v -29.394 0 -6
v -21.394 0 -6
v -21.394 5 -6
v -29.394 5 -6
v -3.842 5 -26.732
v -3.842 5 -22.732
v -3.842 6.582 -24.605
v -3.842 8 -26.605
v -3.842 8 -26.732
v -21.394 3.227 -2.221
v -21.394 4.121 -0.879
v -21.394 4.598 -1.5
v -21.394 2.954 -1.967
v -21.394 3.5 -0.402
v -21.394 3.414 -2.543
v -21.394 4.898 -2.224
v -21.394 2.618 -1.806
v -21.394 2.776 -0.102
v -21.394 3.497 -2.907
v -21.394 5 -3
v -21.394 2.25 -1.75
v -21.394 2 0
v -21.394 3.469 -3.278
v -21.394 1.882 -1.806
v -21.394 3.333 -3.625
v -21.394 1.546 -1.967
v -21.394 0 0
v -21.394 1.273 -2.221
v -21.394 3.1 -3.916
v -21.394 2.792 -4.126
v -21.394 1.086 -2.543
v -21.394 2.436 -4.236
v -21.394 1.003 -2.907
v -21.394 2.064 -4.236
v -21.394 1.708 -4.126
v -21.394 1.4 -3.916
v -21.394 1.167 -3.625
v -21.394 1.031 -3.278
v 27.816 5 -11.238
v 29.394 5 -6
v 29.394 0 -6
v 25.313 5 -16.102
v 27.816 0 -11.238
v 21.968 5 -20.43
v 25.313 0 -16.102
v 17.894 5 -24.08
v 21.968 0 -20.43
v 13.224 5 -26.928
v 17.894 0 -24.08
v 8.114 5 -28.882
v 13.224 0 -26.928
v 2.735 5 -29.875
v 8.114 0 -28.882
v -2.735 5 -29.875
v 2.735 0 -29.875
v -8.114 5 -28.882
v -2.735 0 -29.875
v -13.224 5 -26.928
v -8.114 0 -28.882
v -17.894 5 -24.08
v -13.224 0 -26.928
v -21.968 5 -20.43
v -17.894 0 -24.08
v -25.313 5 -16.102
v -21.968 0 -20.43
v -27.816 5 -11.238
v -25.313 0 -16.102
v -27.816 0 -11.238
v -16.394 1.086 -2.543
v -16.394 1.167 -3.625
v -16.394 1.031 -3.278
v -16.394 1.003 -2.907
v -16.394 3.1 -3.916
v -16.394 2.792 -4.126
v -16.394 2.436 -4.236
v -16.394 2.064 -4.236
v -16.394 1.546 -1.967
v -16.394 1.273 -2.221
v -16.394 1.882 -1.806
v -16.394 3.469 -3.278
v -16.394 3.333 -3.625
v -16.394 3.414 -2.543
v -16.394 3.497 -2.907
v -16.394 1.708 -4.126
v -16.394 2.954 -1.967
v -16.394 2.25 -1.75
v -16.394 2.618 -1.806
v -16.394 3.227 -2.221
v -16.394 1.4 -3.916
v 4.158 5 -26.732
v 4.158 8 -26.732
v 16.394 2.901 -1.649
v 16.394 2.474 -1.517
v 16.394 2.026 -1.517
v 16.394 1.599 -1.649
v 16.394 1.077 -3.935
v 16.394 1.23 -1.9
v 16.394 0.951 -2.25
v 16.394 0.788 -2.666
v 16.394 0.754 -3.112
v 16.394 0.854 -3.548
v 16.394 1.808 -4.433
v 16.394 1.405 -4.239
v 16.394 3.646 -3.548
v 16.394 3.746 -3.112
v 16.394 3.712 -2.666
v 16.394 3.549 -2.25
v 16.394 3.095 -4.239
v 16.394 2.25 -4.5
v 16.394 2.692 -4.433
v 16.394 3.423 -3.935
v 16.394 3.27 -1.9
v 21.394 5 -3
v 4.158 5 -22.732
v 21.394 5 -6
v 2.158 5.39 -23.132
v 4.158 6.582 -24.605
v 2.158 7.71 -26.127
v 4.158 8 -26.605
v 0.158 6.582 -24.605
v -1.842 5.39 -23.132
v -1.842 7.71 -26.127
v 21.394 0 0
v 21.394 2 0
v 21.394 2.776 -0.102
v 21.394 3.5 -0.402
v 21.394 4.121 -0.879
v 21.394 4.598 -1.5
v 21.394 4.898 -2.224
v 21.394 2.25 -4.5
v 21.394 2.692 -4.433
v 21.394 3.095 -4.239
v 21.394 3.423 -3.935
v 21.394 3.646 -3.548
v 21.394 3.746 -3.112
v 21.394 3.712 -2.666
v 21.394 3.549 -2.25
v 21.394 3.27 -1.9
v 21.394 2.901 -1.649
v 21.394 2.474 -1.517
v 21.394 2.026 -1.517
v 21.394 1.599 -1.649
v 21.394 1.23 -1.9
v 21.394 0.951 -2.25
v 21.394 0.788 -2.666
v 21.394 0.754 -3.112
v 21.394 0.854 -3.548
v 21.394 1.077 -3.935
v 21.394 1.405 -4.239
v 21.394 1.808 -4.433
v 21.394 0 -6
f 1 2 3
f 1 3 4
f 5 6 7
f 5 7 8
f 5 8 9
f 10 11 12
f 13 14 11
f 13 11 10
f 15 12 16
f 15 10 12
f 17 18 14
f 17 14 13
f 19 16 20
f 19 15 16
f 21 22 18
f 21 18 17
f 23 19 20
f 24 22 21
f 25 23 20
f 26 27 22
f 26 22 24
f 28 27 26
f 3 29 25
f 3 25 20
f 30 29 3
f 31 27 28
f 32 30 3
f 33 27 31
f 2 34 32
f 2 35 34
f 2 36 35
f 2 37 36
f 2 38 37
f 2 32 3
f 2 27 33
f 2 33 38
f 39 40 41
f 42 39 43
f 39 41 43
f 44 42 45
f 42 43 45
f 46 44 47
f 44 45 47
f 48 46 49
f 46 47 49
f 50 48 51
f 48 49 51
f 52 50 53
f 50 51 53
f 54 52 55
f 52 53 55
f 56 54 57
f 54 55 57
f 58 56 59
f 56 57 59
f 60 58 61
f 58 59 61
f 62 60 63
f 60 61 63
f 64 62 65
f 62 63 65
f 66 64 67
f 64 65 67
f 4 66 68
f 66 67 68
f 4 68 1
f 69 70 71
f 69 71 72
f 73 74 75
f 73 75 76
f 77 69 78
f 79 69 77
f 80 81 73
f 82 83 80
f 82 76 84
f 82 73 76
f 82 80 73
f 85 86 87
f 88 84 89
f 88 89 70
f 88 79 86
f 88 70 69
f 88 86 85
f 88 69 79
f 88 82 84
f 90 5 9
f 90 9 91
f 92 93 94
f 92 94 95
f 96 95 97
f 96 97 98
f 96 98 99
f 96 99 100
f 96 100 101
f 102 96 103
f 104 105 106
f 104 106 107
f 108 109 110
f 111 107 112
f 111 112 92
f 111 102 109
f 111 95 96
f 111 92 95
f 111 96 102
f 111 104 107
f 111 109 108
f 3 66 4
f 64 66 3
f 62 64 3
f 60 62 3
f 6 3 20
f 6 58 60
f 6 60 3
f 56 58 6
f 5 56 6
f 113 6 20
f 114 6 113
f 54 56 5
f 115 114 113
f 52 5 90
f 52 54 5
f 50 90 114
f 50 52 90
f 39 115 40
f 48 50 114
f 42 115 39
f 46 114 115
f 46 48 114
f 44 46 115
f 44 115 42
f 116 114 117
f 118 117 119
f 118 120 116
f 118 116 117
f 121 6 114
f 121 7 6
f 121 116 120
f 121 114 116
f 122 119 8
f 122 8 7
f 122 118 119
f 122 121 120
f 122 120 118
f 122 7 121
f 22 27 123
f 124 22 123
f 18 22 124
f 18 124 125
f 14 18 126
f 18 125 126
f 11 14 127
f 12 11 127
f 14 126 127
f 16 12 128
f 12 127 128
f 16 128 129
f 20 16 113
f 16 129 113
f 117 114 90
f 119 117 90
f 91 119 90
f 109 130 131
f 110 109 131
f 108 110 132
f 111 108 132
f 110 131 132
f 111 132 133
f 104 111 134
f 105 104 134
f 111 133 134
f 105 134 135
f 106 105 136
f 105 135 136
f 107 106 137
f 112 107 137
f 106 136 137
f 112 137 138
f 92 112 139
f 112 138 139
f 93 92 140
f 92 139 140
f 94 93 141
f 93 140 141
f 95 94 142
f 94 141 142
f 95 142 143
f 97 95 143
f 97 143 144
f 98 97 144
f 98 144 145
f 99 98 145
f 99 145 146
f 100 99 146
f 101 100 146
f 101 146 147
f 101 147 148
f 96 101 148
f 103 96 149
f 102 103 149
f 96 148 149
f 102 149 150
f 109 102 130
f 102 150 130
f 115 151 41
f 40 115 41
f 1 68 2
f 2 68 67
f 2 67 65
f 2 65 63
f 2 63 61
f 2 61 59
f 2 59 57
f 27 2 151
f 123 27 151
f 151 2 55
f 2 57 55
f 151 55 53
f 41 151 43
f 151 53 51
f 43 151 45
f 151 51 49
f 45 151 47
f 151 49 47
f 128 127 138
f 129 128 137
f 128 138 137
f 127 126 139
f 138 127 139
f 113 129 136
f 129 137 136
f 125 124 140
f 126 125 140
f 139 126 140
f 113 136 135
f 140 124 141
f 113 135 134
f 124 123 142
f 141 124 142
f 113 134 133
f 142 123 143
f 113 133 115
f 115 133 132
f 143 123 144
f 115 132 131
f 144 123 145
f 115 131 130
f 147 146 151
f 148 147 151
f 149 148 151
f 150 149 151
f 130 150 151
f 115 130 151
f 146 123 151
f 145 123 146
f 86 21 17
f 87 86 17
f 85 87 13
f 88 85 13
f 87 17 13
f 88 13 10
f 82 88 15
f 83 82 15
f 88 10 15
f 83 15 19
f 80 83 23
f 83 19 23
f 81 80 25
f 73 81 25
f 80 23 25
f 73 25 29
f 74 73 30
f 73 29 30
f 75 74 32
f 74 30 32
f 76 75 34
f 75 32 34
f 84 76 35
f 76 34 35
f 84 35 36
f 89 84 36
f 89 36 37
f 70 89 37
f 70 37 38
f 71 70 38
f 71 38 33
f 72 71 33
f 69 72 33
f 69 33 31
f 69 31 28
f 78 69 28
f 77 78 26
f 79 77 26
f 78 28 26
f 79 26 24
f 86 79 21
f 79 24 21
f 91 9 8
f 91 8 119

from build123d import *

# Parameters (mm, degrees)
BOSS_EXTRUDE1_DEPTH = 5
SKETCH3_W           = 8
SKETCH3_H           = 4
BOSS_EXTRUDE2_DEPTH = 3
FILLET1_START       = -3.841593316
FILLET1_DEPTH       = 8
CUT_EXTRUDE1_START  = -10
CUT_EXTRUDE1_DEPTH  = 10
FILLET2_R           = 3
SKETCH6_R           = 1.5
CUT_EXTRUDE2_DEPTH  = 5
SKETCH7_R           = 1.25
CUT_EXTRUDE3_DEPTH  = 5


with BuildPart() as part:
    # Sketch1 → Boss-Extrude1 (new body)
    with BuildSketch(Plane(origin=(0, 0, 0), x_dir=(1, 0, 0), z_dir=(0, 1, 0))):
        with BuildLine():
            Line((-30, 0), (30, 0))
            ThreePointArc((30, 0), (0, 30), (-30, 0))
        make_face()
    extrude(amount=BOSS_EXTRUDE1_DEPTH)

    # Sketch3 → Boss-Extrude2 (add)
    with BuildSketch(Plane(origin=(0, 5, 0), x_dir=(1, 0, 0), z_dir=(0, 1, 0))):
        with Locations((0.158406684, 24.731666579)):
            Rectangle(SKETCH3_W, SKETCH3_H)
    extrude(amount=BOSS_EXTRUDE2_DEPTH)

    # Fillet1: read off the stored shape, not the designer's step
    # Fillet1 outline → Fillet1 (cut)
    with BuildSketch(Plane.YZ.offset(FILLET1_START)):
        with BuildLine():
            Line((8, -22.731666579), (5, -22.731666579))
            add(Edge.make_bspline(
                [(5, -22.731666579), (8, -23.506263249), (8, -26.604649926)],
                knots=[0, 0, 0, 1, 1, 1], degree=2, weights=[1, 0.057495957, 1]))
            Line((8, -26.604649926), (8, -22.731666579))
        make_face()
    extrude(amount=FILLET1_DEPTH, mode=Mode.SUBTRACT)

    # Sketch5 → Cut-Extrude1 (cut)
    with BuildSketch(Plane(origin=(0, 5, 0), x_dir=(1, 0, 0), z_dir=(0, 1, 0)).offset(CUT_EXTRUDE1_START)):
        with BuildLine():
            Line((-21.393876913, 0), (-21.393876913, 6))
            Line((-21.393876913, 6), (-29.393876913, 6))
            ThreePointArc((-29.393876913, 6), (-29.84808459, 3.01526886), (-30, 0))
            Line((-30, 0), (-21.393876913, 0))
        make_face()
        with BuildLine():
            Line((21.393876913, 6), (29.393876913, 6))
            ThreePointArc((29.393876913, 6), (29.84808459, 3.01526886), (30, 0))
            Line((30, 0), (21.393876913, 0))
            Line((21.393876913, 0), (21.393876913, 6))
        make_face()
    extrude(amount=CUT_EXTRUDE1_DEPTH, mode=Mode.SUBTRACT)

    # Fillet2
    fillet2_edges = [part.edges().sort_by_distance(p)[0] for p in [
        (0, 5, 0),
    ]]
    fillet(fillet2_edges, radius=FILLET2_R)

    # Sketch6 → Cut-Extrude2 (cut)
    with BuildSketch(Plane(origin=(21.393876913, 0, 0), x_dir=(0, 0, -1), z_dir=(1, 0, 0))):
        with Locations((3, 2.25)):
            Circle(SKETCH6_R)
    extrude(amount=-CUT_EXTRUDE2_DEPTH, mode=Mode.SUBTRACT)

    # Sketch7 → Cut-Extrude3 (cut)
    with BuildSketch(Plane.ZY.offset(21.393876913)):
        with Locations((-3, 2.25)):
            Circle(SKETCH7_R)
    extrude(amount=-CUT_EXTRUDE3_DEPTH, mode=Mode.SUBTRACT)


solid = part.part
